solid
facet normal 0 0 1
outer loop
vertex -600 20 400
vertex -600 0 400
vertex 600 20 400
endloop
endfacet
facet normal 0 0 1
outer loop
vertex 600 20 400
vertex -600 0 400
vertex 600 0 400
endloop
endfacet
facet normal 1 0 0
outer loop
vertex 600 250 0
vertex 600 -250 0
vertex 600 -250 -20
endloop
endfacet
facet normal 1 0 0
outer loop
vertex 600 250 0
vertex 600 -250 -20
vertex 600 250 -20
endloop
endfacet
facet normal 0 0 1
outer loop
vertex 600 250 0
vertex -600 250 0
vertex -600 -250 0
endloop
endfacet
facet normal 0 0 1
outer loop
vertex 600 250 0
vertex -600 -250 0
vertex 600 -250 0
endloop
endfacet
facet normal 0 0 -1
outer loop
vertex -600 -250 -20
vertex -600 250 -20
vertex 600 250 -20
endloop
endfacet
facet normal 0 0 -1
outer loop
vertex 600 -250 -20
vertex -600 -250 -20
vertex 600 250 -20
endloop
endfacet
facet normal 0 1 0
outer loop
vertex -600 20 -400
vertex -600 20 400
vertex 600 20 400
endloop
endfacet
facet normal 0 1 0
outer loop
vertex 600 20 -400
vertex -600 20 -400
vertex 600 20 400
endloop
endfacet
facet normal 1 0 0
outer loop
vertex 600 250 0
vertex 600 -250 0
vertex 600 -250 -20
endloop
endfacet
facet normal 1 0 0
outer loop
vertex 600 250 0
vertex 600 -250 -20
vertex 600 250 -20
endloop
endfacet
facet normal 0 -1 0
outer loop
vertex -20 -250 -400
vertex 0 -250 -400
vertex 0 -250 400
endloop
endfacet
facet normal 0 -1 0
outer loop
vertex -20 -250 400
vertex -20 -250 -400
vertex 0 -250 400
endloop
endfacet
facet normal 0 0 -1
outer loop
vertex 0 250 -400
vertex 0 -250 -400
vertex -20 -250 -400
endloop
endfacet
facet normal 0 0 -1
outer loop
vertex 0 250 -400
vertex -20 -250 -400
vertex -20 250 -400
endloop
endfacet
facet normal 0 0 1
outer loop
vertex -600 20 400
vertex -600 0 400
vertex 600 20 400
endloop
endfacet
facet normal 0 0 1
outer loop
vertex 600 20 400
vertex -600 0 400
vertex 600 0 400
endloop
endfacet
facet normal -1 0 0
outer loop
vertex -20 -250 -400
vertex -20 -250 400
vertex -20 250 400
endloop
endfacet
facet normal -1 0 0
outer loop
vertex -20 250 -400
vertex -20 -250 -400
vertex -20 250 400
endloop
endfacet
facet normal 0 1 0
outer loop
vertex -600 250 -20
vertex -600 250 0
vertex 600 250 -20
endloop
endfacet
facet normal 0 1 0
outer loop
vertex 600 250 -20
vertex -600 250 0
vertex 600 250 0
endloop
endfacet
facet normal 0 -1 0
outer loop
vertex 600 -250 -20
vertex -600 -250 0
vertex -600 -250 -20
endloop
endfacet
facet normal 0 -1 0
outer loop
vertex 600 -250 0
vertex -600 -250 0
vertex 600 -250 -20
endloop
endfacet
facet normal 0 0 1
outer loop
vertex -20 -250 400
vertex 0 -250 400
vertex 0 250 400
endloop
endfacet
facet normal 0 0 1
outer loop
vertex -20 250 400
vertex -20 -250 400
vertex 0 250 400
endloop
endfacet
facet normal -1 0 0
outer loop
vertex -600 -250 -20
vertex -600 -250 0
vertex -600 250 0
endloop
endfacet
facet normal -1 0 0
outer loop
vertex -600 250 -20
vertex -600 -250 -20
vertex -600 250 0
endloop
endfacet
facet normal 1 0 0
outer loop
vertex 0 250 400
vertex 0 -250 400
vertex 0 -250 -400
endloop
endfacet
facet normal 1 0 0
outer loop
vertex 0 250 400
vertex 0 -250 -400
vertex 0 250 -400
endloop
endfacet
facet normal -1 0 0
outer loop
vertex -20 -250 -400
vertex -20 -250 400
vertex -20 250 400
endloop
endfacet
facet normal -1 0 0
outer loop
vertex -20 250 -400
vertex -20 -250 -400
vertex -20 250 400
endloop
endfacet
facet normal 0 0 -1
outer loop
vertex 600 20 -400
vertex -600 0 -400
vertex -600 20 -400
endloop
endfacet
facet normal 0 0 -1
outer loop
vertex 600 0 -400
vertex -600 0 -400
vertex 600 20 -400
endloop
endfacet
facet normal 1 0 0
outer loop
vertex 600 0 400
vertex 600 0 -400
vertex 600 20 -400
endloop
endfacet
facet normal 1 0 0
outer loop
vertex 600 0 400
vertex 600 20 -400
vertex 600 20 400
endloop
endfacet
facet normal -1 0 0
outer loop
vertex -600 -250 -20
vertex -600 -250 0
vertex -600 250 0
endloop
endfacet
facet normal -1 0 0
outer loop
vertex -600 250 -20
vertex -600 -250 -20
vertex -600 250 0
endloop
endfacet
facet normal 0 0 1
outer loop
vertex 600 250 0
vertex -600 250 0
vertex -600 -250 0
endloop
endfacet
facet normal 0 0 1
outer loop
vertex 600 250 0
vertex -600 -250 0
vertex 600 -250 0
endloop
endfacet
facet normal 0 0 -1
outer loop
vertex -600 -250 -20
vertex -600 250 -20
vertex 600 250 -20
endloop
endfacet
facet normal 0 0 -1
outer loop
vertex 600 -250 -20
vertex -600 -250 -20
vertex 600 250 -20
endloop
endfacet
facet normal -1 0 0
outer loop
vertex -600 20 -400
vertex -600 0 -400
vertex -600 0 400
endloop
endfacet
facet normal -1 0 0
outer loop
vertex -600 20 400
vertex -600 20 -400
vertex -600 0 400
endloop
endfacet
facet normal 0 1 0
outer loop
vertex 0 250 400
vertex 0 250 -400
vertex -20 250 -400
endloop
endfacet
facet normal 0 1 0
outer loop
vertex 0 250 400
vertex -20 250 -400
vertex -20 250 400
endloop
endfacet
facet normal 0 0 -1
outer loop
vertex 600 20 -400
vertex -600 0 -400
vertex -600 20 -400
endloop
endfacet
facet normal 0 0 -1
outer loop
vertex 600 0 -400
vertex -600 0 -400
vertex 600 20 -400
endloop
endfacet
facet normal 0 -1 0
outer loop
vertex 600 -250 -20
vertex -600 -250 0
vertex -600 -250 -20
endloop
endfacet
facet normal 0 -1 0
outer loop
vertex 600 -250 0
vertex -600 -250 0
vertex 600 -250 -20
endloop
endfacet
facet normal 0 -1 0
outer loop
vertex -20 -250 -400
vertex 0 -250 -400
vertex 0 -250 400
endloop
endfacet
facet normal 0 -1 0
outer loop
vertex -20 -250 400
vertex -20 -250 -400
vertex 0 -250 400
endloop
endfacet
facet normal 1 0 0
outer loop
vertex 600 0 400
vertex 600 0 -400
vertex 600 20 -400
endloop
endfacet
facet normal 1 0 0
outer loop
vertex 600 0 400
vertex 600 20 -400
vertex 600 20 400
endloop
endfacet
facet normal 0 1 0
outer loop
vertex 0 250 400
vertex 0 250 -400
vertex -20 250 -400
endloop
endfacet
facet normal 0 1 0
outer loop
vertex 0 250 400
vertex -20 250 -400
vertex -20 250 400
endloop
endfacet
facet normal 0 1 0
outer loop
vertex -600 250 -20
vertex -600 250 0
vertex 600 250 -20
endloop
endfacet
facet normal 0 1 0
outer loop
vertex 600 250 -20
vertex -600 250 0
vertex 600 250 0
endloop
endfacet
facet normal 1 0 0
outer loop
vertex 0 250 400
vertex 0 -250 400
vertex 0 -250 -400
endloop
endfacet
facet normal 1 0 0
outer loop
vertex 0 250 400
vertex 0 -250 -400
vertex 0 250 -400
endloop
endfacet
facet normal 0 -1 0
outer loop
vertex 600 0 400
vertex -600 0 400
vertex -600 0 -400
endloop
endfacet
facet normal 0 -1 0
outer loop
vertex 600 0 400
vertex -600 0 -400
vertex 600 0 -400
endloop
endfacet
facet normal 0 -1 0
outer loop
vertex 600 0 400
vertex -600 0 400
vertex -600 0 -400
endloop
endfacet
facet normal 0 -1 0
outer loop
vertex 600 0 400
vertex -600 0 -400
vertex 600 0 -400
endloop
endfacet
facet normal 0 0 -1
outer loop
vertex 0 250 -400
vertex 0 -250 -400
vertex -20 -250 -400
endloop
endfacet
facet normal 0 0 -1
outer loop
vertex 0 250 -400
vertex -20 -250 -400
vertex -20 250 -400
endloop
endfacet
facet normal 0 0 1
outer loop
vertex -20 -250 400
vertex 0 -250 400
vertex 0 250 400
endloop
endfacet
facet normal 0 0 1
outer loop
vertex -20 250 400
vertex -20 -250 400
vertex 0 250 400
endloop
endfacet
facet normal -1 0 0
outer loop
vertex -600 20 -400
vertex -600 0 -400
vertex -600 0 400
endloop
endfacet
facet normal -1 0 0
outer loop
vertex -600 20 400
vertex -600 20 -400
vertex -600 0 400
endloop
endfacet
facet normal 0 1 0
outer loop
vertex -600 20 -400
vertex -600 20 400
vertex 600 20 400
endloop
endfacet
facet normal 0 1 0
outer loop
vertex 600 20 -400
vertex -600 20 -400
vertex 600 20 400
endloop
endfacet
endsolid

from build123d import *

# Parameters (mm, degrees)
F0_W      = 1200
F0_H      = 500
F1_DEPTH  = 20
F2_W      = 1200
F2_H      = 500
F3_DEPTH  = 20
F4_W      = 1200
F4_H      = 800
F5_DEPTH  = 20
F6_W      = 1200
F6_H      = 800
F7_DEPTH  = 20
F8_W      = 500
F8_H      = 800
F9_DEPTH  = 20
F10_W     = 500
F10_H     = 800
F11_DEPTH = 20


with BuildPart() as f1:
    # F0 (on Top) → F1 (new body)
    with BuildSketch(Plane.XY):
        Rectangle(F0_W, F0_H)
    extrude(amount=-F1_DEPTH)


with BuildPart() as f3:
    # F2 (on Top) → F3 (new body)
    with BuildSketch(Plane.XY):
        Rectangle(F2_W, F2_H)
    extrude(amount=-F3_DEPTH)


with BuildPart() as f5:
    # F4 (on Front) → F5 (new body)
    with BuildSketch(Plane.XZ):
        Rectangle(F4_W, F4_H)
    extrude(amount=-F5_DEPTH)


with BuildPart() as f7:
    # F6 (on Front) → F7 (new body)
    with BuildSketch(Plane.XZ):
        Rectangle(F6_W, F6_H)
    extrude(amount=-F7_DEPTH)


with BuildPart() as f9:
    # F8 (on Right) → F9 (new body)
    with BuildSketch(Plane.YZ):
        Rectangle(F8_W, F8_H)
    extrude(amount=-F9_DEPTH)


with BuildPart() as f11:
    # F10 (on Right) → F11 (new body)
    with BuildSketch(Plane.YZ):
        Rectangle(F10_W, F10_H)
    extrude(amount=-F11_DEPTH)


solid = Compound([f1.part, f3.part, f5.part, f7.part, f9.part, f11.part])
